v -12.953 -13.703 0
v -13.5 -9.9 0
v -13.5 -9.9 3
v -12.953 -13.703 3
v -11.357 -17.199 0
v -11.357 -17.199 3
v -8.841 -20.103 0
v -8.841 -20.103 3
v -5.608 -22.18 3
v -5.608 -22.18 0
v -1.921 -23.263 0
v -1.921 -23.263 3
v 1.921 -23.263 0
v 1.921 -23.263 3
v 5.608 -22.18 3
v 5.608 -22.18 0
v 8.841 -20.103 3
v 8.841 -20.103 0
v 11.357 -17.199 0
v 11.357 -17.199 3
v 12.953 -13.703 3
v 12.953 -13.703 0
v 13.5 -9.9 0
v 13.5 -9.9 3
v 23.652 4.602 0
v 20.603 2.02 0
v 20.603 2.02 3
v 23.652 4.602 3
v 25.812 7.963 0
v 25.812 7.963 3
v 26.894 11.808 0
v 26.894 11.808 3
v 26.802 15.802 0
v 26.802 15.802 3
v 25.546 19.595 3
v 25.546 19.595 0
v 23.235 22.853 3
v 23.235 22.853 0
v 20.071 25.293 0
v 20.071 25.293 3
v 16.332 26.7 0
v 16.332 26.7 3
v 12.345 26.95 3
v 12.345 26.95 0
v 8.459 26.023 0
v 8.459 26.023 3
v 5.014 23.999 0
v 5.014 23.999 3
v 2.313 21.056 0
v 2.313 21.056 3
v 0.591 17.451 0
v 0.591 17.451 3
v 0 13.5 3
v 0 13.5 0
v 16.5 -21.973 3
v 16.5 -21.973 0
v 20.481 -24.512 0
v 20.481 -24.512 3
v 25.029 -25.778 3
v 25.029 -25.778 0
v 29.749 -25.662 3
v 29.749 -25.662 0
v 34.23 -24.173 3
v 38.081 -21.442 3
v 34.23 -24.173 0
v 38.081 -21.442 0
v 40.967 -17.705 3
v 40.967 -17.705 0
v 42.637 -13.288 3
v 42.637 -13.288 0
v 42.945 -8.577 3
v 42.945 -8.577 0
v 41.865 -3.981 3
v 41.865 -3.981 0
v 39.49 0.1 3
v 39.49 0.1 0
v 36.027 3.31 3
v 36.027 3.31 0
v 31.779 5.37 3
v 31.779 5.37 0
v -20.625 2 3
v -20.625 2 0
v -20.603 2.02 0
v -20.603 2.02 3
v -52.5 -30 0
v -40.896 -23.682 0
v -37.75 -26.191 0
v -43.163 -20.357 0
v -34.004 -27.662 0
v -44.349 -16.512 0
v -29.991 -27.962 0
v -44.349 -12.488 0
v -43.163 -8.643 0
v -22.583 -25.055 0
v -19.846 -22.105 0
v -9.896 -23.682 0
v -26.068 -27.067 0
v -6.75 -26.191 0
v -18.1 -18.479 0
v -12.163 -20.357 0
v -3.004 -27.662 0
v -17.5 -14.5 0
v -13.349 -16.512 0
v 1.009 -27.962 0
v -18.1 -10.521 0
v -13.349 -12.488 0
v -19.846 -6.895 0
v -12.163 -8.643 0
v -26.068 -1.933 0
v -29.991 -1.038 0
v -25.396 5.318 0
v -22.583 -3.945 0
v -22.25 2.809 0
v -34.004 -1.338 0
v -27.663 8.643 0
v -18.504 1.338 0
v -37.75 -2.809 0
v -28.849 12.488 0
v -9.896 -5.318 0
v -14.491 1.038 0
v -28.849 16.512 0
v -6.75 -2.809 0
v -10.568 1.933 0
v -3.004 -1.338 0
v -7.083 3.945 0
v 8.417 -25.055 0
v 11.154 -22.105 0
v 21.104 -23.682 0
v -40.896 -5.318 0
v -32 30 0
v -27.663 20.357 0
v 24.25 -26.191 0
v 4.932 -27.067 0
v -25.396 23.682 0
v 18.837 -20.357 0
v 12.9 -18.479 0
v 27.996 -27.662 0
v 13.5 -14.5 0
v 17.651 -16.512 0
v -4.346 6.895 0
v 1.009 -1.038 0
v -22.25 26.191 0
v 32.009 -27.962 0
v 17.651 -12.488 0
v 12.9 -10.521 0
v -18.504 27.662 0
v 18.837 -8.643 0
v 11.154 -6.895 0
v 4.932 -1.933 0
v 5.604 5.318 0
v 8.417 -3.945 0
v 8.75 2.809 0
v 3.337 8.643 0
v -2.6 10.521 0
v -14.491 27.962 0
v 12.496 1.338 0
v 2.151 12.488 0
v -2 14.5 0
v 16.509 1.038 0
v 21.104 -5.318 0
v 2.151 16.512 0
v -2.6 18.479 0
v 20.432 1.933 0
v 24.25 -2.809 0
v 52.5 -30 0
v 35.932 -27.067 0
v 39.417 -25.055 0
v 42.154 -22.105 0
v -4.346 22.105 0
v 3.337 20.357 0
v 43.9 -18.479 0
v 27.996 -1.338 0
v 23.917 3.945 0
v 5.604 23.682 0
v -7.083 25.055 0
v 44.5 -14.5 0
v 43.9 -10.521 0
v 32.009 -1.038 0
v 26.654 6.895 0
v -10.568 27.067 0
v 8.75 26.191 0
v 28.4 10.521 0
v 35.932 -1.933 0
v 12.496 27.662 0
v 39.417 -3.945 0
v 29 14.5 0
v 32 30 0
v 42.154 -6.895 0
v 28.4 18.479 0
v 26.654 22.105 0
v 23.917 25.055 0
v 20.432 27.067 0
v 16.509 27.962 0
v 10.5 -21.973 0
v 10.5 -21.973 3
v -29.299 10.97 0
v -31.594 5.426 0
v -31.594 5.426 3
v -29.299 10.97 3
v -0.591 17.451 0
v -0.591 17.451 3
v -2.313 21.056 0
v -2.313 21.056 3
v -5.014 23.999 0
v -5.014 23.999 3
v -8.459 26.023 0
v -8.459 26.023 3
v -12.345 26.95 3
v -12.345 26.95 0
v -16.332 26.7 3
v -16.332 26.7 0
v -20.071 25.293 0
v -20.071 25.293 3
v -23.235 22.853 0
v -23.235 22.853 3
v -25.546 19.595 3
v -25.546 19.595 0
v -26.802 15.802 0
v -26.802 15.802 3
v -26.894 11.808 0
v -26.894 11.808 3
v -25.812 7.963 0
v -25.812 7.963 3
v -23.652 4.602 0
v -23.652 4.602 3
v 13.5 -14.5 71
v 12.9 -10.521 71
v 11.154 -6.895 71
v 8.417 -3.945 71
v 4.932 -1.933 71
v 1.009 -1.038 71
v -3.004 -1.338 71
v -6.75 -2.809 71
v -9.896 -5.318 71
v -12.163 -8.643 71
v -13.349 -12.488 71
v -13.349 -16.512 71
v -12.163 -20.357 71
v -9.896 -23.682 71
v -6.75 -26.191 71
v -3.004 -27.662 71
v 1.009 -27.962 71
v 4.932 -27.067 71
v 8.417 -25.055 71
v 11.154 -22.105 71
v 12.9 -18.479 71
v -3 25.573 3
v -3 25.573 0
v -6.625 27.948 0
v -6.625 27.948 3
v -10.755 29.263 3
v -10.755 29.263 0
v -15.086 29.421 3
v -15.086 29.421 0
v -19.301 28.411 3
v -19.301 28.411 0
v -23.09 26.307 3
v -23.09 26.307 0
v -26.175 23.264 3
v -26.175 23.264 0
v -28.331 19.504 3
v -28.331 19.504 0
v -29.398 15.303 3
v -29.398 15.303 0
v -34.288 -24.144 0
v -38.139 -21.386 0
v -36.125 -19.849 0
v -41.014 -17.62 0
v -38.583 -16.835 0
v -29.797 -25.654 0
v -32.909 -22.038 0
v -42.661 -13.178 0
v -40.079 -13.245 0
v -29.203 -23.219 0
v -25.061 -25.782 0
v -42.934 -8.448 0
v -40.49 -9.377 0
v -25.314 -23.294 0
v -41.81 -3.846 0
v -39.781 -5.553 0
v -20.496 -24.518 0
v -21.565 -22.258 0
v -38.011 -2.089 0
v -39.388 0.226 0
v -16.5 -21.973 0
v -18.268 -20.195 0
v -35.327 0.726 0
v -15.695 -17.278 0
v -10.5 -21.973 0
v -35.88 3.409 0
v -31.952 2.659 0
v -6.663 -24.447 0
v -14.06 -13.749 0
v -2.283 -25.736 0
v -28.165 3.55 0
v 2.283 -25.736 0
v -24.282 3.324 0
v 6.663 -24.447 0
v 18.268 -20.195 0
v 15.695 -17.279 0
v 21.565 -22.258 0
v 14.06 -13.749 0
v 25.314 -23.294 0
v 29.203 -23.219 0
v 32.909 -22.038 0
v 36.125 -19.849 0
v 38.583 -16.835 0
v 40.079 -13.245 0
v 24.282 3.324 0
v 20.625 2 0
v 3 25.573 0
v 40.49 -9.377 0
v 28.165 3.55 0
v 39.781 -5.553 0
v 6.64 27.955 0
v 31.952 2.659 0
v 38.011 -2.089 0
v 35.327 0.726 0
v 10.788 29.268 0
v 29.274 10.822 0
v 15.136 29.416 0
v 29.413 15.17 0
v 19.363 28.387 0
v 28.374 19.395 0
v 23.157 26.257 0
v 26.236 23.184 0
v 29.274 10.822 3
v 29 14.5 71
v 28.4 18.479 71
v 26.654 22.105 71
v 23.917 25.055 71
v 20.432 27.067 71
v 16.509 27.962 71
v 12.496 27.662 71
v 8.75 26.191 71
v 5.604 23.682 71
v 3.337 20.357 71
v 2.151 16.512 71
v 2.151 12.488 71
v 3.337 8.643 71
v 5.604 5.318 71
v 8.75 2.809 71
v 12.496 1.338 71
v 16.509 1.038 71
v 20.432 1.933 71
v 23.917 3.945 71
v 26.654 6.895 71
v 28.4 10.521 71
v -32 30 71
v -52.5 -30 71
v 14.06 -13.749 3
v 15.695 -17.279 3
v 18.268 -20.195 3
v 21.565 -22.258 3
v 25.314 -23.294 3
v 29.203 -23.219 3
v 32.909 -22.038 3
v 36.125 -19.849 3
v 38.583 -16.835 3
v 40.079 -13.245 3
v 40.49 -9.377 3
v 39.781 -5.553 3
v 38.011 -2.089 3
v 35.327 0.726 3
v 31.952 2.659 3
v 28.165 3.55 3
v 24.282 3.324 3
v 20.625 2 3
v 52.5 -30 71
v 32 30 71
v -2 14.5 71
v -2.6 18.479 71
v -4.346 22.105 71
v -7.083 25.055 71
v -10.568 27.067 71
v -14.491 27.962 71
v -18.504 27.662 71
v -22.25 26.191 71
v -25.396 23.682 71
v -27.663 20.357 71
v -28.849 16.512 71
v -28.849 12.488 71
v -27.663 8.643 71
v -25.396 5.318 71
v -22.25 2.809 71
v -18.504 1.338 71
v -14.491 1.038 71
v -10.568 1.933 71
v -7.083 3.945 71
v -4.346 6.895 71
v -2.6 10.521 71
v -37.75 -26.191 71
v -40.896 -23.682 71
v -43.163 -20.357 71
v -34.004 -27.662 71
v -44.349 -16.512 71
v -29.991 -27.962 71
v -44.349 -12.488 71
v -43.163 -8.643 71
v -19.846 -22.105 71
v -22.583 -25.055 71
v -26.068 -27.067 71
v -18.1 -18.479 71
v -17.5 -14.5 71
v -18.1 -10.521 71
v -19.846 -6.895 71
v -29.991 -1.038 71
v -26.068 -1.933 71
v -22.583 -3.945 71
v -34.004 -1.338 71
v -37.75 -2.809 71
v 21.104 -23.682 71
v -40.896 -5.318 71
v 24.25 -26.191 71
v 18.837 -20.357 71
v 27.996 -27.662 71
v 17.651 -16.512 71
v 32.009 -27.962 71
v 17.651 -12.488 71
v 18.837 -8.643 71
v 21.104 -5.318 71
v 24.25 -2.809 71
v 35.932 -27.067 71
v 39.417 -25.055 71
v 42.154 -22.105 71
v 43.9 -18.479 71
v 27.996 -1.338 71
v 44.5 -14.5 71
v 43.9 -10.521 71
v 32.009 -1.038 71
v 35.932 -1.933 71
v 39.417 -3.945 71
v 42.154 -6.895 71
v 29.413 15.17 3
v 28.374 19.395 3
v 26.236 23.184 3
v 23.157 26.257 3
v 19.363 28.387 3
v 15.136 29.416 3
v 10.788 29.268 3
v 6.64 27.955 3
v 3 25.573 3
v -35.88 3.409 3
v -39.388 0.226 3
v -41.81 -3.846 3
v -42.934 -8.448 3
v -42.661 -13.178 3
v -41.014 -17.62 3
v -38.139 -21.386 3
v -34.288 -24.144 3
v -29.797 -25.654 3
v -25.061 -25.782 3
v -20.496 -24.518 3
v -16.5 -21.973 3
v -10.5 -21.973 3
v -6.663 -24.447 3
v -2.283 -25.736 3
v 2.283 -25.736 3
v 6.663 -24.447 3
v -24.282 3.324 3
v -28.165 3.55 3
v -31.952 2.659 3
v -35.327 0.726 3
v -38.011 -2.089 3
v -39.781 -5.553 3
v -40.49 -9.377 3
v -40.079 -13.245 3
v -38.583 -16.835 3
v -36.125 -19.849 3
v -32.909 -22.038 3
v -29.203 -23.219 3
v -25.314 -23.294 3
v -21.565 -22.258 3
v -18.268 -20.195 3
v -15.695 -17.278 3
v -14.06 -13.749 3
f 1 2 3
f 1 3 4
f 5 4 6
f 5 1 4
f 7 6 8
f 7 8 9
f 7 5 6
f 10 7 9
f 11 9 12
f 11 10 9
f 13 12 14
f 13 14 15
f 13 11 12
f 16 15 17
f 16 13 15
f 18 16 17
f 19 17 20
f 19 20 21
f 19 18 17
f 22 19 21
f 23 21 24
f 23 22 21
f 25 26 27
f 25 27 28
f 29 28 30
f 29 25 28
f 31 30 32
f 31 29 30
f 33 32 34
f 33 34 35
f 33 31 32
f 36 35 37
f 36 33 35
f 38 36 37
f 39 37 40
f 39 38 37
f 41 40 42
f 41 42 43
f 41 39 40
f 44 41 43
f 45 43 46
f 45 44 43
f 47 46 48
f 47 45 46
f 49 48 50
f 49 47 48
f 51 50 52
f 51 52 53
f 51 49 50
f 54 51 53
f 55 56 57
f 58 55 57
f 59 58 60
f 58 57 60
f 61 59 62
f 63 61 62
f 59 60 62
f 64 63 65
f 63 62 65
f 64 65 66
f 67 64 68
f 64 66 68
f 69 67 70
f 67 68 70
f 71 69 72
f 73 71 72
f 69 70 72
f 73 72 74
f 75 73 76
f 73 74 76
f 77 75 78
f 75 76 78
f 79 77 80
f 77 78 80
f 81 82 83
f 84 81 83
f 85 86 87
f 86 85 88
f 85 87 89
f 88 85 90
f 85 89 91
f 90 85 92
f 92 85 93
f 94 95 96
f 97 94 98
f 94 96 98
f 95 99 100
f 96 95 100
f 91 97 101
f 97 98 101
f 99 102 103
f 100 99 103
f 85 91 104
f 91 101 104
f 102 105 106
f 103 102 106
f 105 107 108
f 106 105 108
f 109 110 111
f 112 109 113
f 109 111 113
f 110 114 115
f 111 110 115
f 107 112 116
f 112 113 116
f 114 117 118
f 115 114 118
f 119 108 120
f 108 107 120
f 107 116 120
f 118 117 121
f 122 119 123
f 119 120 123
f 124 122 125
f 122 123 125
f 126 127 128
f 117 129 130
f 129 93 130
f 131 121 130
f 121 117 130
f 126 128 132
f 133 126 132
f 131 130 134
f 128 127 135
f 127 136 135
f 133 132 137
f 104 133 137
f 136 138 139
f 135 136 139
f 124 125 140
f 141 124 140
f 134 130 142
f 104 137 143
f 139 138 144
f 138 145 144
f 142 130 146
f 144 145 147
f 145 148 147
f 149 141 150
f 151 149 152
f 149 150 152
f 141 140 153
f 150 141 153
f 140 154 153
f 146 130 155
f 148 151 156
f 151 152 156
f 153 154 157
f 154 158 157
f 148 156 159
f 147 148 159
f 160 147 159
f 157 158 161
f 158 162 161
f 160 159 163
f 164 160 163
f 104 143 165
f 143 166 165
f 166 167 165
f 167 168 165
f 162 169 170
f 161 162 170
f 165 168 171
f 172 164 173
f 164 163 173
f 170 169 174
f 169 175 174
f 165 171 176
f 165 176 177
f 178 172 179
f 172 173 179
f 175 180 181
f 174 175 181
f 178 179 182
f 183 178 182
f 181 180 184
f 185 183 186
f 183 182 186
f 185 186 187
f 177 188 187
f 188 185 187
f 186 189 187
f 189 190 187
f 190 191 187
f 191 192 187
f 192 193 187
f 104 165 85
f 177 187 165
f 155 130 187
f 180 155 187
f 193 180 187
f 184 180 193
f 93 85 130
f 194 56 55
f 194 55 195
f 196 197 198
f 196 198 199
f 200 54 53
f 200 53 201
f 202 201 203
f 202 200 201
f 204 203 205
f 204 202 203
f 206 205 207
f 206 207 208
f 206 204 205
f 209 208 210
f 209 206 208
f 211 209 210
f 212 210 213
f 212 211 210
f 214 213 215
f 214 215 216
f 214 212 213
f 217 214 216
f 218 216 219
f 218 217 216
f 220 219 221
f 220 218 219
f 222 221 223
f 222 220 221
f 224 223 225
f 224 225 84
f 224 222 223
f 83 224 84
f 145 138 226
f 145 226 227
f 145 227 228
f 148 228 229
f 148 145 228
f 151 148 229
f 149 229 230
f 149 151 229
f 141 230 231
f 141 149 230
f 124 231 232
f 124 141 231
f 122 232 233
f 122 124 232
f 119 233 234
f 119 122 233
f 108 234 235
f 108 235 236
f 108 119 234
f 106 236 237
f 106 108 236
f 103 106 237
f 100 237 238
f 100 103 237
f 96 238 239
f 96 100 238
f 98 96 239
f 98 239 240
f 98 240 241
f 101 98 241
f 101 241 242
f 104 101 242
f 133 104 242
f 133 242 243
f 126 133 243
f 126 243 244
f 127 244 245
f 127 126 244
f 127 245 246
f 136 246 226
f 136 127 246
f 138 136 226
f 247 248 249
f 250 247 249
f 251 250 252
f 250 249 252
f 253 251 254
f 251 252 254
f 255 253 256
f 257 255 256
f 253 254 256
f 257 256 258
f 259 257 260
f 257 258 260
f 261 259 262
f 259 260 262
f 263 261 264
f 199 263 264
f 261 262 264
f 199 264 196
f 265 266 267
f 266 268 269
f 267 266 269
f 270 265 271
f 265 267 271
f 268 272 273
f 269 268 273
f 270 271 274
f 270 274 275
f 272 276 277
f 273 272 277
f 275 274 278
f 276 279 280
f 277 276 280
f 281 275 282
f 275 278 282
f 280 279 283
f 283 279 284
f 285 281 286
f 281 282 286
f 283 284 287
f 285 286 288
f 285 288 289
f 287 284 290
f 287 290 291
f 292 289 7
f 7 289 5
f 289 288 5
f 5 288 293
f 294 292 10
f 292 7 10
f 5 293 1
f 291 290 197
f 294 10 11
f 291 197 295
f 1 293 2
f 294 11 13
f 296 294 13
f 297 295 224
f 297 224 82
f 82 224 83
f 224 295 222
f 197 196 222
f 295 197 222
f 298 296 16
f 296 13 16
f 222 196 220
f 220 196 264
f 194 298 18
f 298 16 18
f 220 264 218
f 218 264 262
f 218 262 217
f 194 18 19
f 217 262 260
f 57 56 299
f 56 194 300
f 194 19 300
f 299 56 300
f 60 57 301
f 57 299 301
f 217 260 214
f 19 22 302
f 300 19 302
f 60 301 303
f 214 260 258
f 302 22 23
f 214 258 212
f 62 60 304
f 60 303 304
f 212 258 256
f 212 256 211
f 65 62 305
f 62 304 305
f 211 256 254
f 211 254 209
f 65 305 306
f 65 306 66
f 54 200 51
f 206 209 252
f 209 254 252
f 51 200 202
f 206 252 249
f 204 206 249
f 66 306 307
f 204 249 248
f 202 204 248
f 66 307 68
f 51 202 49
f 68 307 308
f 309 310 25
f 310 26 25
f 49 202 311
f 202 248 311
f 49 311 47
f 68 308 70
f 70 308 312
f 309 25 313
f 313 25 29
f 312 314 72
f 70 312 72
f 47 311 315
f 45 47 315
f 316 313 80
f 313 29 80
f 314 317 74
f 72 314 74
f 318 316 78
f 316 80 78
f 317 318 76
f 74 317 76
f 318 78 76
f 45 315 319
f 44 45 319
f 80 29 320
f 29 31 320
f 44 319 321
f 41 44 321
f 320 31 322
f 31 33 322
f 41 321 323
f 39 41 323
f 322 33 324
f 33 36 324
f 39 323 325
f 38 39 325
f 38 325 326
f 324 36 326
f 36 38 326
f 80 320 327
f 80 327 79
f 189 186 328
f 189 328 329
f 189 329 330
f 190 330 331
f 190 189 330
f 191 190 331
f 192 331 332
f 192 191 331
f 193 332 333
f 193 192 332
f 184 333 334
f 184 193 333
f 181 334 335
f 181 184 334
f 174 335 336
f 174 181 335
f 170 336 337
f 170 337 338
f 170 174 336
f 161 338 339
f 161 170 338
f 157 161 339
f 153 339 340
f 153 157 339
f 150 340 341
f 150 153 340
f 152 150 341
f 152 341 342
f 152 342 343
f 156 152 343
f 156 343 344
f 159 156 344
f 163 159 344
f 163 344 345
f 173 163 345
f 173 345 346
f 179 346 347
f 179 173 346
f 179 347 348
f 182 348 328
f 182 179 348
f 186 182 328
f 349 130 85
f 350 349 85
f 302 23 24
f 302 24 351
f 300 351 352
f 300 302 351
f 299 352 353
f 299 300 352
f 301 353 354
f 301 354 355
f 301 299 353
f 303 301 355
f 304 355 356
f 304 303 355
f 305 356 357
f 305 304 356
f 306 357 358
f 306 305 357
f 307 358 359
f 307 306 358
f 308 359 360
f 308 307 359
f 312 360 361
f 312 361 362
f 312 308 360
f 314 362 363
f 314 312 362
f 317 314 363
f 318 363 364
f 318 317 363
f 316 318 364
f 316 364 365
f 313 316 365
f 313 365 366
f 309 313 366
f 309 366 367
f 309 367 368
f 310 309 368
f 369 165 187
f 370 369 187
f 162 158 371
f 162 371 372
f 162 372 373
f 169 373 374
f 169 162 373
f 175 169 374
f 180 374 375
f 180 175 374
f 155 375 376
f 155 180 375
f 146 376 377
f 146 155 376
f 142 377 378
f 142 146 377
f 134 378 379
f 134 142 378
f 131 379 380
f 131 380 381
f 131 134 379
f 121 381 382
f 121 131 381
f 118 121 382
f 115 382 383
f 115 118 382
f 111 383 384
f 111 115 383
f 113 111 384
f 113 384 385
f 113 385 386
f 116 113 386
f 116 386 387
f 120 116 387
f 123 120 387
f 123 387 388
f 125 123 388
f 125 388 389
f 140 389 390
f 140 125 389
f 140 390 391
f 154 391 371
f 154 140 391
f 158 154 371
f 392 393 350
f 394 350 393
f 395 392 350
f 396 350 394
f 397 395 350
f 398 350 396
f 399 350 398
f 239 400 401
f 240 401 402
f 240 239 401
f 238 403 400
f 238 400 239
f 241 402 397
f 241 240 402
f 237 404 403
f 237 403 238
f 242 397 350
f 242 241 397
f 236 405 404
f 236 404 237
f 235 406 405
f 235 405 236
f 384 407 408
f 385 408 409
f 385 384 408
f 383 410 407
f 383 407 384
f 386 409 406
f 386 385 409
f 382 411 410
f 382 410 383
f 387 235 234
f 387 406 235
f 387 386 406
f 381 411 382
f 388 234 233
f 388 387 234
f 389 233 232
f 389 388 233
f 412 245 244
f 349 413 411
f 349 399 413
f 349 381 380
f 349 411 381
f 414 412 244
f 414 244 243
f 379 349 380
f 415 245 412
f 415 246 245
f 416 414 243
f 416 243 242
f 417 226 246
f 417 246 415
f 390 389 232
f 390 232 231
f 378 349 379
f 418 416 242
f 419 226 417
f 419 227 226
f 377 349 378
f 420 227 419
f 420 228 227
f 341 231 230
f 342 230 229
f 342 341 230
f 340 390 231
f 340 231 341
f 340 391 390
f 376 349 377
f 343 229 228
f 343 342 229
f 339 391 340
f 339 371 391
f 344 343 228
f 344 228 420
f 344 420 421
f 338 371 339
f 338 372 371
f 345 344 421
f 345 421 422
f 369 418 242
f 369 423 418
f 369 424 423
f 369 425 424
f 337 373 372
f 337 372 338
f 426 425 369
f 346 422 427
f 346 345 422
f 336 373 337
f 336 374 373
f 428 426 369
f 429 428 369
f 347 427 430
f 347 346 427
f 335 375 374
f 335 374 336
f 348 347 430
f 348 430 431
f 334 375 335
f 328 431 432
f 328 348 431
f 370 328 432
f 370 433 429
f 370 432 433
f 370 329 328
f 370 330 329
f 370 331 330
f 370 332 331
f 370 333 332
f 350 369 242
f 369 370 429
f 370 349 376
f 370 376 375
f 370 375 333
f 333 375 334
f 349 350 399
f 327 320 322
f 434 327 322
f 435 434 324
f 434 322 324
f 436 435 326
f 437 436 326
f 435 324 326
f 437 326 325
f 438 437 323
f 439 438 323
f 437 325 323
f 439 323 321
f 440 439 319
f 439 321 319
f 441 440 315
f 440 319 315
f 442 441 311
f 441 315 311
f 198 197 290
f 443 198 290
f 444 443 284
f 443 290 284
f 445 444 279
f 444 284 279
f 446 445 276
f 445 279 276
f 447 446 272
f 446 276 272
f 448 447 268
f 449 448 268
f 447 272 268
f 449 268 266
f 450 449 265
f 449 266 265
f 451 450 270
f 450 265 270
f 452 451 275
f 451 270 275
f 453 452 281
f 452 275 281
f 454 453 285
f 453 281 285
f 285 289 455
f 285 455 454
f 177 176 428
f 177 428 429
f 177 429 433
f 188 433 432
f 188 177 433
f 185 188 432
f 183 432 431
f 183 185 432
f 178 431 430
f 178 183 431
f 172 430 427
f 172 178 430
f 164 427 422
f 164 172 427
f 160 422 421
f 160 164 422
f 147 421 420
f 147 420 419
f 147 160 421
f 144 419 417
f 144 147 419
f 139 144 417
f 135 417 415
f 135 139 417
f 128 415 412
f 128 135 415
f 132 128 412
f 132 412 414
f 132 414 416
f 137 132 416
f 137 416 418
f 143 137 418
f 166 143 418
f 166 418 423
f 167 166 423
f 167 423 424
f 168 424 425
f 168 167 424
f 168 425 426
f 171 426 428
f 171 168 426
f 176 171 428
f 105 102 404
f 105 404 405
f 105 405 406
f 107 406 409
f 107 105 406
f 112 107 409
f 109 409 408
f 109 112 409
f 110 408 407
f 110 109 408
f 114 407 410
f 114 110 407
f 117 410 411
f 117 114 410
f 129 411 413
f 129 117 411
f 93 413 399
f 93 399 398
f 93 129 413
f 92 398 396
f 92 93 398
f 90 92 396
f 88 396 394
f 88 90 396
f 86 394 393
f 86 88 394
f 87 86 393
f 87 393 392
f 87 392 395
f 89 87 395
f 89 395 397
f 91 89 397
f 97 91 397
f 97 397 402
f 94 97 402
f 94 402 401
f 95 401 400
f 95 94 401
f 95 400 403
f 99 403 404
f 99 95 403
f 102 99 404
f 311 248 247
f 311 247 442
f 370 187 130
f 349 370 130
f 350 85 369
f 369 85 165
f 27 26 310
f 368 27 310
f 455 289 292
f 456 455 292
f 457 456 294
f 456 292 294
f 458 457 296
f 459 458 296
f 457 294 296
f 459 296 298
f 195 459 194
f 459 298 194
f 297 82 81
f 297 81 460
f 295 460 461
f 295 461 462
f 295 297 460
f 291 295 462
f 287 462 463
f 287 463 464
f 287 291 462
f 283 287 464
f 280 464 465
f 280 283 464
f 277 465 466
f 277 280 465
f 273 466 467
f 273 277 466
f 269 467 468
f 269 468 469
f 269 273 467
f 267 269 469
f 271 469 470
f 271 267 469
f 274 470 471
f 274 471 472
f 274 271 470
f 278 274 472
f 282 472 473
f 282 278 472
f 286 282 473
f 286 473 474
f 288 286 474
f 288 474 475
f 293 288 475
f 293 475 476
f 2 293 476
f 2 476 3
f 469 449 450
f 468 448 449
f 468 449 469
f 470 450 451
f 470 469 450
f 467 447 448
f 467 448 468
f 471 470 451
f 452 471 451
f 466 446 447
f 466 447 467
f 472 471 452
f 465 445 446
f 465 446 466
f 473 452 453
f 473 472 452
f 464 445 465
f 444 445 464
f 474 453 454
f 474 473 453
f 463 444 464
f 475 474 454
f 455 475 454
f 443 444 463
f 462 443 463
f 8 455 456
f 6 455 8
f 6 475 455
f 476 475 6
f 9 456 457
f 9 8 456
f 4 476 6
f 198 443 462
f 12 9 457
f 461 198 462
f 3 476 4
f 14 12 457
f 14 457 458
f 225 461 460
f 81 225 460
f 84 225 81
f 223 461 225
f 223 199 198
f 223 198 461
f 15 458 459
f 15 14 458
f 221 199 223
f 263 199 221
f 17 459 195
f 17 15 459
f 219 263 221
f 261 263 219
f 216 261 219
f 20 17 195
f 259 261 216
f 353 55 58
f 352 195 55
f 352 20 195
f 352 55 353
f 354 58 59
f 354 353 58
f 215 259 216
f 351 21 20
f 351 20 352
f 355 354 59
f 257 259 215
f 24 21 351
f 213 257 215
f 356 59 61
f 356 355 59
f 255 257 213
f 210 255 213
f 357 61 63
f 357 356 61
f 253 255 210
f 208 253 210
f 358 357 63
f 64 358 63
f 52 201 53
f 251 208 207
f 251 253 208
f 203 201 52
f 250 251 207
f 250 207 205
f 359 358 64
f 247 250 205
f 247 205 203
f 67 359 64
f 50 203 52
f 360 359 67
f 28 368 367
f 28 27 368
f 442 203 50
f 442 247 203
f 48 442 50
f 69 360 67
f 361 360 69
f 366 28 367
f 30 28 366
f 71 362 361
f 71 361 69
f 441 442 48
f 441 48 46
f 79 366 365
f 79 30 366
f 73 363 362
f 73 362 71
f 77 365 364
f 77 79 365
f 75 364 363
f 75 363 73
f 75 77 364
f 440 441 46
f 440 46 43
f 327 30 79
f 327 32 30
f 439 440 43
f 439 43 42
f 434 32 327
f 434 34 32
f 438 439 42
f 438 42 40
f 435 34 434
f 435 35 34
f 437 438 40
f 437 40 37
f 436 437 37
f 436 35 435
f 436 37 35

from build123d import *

# Parameters (mm, degrees)
SKETCH_R     = 13.5
PAD_DEPTH    = 71
PAD001_DEPTH = 3


with BuildPart() as body:
    # Sketch → Pad (new body)
    with BuildSketch(Plane.XY):
        Polygon((-52.5, -30), (52.5, -30), (32, 30), (-32, 30), align=None)
        with Locations((-15.5, 14.5)):
            Circle(SKETCH_R, mode=Mode.SUBTRACT)
        with Locations((15.5, 14.5)):
            Circle(SKETCH_R, mode=Mode.SUBTRACT)
        with Locations((31, -14.5)):
            Circle(SKETCH_R, mode=Mode.SUBTRACT)
        with Locations((0, -14.5)):
            Circle(SKETCH_R, mode=Mode.SUBTRACT)
        with Locations((-31, -14.5)):
            Circle(SKETCH_R, mode=Mode.SUBTRACT)
    extrude(amount=PAD_DEPTH)


with BuildPart() as body001:
    # Sketch001 → Pad001 (new body)
    with BuildSketch(Plane.XY):
        with BuildLine():
            ThreePointArc((-31.593551, 5.426425), (-41.014266, -17.620126), (-16.500017, -21.972711))
            Line((-10.500017, -21.972711), (-16.500017, -21.972711))
            ThreePointArc((-10.500017, -21.972711), (0, -25.90003), (10.500017, -21.972711))
            Line((16.500017, -21.972711), (10.500017, -21.972711))
            ThreePointArc((16.500017, -21.972711), (40.967281, -17.70481), (31.778746, 5.369695))
            Line((29.274294, 10.822009), (31.778746, 5.369695))
            ThreePointArc((29.274294, 10.822009), (21.33264, 27.451694), (3, 25.572696))
            Line((-3, 25.572696), (3, 25.572696))
            ThreePointArc((-3, 25.572696), (-21.267054, 27.488312), (-29.298744, 10.970237))
            Line((-31.593551, 5.426425), (-29.298744, 10.970237))
        make_face()
        with BuildLine():
            ThreePointArc((-20.625049, 2), (-38.58257, -16.834989), (-13.5, -9.900001))
            ThreePointArc((-13.5, -9.900001), (-1.4e-05, -23.40003), (13.5, -9.900028))
            ThreePointArc((13.5, -9.900028), (38.582577, -16.834978), (20.625049, 2))
            Line((20.603492, 2.02), (20.625049, 2))
            ThreePointArc((20.603492, 2.02), (20.070877, 25.292946), (0, 13.5))
            ThreePointArc((0, 13.5), (-20.070877, 25.292946), (-20.603492, 2.02))
            Line((-20.625049, 2), (-20.603492, 2.02))
        make_face(mode=Mode.SUBTRACT)
    extrude(amount=PAD001_DEPTH)


solid = Compound([body.part, body001.part])
